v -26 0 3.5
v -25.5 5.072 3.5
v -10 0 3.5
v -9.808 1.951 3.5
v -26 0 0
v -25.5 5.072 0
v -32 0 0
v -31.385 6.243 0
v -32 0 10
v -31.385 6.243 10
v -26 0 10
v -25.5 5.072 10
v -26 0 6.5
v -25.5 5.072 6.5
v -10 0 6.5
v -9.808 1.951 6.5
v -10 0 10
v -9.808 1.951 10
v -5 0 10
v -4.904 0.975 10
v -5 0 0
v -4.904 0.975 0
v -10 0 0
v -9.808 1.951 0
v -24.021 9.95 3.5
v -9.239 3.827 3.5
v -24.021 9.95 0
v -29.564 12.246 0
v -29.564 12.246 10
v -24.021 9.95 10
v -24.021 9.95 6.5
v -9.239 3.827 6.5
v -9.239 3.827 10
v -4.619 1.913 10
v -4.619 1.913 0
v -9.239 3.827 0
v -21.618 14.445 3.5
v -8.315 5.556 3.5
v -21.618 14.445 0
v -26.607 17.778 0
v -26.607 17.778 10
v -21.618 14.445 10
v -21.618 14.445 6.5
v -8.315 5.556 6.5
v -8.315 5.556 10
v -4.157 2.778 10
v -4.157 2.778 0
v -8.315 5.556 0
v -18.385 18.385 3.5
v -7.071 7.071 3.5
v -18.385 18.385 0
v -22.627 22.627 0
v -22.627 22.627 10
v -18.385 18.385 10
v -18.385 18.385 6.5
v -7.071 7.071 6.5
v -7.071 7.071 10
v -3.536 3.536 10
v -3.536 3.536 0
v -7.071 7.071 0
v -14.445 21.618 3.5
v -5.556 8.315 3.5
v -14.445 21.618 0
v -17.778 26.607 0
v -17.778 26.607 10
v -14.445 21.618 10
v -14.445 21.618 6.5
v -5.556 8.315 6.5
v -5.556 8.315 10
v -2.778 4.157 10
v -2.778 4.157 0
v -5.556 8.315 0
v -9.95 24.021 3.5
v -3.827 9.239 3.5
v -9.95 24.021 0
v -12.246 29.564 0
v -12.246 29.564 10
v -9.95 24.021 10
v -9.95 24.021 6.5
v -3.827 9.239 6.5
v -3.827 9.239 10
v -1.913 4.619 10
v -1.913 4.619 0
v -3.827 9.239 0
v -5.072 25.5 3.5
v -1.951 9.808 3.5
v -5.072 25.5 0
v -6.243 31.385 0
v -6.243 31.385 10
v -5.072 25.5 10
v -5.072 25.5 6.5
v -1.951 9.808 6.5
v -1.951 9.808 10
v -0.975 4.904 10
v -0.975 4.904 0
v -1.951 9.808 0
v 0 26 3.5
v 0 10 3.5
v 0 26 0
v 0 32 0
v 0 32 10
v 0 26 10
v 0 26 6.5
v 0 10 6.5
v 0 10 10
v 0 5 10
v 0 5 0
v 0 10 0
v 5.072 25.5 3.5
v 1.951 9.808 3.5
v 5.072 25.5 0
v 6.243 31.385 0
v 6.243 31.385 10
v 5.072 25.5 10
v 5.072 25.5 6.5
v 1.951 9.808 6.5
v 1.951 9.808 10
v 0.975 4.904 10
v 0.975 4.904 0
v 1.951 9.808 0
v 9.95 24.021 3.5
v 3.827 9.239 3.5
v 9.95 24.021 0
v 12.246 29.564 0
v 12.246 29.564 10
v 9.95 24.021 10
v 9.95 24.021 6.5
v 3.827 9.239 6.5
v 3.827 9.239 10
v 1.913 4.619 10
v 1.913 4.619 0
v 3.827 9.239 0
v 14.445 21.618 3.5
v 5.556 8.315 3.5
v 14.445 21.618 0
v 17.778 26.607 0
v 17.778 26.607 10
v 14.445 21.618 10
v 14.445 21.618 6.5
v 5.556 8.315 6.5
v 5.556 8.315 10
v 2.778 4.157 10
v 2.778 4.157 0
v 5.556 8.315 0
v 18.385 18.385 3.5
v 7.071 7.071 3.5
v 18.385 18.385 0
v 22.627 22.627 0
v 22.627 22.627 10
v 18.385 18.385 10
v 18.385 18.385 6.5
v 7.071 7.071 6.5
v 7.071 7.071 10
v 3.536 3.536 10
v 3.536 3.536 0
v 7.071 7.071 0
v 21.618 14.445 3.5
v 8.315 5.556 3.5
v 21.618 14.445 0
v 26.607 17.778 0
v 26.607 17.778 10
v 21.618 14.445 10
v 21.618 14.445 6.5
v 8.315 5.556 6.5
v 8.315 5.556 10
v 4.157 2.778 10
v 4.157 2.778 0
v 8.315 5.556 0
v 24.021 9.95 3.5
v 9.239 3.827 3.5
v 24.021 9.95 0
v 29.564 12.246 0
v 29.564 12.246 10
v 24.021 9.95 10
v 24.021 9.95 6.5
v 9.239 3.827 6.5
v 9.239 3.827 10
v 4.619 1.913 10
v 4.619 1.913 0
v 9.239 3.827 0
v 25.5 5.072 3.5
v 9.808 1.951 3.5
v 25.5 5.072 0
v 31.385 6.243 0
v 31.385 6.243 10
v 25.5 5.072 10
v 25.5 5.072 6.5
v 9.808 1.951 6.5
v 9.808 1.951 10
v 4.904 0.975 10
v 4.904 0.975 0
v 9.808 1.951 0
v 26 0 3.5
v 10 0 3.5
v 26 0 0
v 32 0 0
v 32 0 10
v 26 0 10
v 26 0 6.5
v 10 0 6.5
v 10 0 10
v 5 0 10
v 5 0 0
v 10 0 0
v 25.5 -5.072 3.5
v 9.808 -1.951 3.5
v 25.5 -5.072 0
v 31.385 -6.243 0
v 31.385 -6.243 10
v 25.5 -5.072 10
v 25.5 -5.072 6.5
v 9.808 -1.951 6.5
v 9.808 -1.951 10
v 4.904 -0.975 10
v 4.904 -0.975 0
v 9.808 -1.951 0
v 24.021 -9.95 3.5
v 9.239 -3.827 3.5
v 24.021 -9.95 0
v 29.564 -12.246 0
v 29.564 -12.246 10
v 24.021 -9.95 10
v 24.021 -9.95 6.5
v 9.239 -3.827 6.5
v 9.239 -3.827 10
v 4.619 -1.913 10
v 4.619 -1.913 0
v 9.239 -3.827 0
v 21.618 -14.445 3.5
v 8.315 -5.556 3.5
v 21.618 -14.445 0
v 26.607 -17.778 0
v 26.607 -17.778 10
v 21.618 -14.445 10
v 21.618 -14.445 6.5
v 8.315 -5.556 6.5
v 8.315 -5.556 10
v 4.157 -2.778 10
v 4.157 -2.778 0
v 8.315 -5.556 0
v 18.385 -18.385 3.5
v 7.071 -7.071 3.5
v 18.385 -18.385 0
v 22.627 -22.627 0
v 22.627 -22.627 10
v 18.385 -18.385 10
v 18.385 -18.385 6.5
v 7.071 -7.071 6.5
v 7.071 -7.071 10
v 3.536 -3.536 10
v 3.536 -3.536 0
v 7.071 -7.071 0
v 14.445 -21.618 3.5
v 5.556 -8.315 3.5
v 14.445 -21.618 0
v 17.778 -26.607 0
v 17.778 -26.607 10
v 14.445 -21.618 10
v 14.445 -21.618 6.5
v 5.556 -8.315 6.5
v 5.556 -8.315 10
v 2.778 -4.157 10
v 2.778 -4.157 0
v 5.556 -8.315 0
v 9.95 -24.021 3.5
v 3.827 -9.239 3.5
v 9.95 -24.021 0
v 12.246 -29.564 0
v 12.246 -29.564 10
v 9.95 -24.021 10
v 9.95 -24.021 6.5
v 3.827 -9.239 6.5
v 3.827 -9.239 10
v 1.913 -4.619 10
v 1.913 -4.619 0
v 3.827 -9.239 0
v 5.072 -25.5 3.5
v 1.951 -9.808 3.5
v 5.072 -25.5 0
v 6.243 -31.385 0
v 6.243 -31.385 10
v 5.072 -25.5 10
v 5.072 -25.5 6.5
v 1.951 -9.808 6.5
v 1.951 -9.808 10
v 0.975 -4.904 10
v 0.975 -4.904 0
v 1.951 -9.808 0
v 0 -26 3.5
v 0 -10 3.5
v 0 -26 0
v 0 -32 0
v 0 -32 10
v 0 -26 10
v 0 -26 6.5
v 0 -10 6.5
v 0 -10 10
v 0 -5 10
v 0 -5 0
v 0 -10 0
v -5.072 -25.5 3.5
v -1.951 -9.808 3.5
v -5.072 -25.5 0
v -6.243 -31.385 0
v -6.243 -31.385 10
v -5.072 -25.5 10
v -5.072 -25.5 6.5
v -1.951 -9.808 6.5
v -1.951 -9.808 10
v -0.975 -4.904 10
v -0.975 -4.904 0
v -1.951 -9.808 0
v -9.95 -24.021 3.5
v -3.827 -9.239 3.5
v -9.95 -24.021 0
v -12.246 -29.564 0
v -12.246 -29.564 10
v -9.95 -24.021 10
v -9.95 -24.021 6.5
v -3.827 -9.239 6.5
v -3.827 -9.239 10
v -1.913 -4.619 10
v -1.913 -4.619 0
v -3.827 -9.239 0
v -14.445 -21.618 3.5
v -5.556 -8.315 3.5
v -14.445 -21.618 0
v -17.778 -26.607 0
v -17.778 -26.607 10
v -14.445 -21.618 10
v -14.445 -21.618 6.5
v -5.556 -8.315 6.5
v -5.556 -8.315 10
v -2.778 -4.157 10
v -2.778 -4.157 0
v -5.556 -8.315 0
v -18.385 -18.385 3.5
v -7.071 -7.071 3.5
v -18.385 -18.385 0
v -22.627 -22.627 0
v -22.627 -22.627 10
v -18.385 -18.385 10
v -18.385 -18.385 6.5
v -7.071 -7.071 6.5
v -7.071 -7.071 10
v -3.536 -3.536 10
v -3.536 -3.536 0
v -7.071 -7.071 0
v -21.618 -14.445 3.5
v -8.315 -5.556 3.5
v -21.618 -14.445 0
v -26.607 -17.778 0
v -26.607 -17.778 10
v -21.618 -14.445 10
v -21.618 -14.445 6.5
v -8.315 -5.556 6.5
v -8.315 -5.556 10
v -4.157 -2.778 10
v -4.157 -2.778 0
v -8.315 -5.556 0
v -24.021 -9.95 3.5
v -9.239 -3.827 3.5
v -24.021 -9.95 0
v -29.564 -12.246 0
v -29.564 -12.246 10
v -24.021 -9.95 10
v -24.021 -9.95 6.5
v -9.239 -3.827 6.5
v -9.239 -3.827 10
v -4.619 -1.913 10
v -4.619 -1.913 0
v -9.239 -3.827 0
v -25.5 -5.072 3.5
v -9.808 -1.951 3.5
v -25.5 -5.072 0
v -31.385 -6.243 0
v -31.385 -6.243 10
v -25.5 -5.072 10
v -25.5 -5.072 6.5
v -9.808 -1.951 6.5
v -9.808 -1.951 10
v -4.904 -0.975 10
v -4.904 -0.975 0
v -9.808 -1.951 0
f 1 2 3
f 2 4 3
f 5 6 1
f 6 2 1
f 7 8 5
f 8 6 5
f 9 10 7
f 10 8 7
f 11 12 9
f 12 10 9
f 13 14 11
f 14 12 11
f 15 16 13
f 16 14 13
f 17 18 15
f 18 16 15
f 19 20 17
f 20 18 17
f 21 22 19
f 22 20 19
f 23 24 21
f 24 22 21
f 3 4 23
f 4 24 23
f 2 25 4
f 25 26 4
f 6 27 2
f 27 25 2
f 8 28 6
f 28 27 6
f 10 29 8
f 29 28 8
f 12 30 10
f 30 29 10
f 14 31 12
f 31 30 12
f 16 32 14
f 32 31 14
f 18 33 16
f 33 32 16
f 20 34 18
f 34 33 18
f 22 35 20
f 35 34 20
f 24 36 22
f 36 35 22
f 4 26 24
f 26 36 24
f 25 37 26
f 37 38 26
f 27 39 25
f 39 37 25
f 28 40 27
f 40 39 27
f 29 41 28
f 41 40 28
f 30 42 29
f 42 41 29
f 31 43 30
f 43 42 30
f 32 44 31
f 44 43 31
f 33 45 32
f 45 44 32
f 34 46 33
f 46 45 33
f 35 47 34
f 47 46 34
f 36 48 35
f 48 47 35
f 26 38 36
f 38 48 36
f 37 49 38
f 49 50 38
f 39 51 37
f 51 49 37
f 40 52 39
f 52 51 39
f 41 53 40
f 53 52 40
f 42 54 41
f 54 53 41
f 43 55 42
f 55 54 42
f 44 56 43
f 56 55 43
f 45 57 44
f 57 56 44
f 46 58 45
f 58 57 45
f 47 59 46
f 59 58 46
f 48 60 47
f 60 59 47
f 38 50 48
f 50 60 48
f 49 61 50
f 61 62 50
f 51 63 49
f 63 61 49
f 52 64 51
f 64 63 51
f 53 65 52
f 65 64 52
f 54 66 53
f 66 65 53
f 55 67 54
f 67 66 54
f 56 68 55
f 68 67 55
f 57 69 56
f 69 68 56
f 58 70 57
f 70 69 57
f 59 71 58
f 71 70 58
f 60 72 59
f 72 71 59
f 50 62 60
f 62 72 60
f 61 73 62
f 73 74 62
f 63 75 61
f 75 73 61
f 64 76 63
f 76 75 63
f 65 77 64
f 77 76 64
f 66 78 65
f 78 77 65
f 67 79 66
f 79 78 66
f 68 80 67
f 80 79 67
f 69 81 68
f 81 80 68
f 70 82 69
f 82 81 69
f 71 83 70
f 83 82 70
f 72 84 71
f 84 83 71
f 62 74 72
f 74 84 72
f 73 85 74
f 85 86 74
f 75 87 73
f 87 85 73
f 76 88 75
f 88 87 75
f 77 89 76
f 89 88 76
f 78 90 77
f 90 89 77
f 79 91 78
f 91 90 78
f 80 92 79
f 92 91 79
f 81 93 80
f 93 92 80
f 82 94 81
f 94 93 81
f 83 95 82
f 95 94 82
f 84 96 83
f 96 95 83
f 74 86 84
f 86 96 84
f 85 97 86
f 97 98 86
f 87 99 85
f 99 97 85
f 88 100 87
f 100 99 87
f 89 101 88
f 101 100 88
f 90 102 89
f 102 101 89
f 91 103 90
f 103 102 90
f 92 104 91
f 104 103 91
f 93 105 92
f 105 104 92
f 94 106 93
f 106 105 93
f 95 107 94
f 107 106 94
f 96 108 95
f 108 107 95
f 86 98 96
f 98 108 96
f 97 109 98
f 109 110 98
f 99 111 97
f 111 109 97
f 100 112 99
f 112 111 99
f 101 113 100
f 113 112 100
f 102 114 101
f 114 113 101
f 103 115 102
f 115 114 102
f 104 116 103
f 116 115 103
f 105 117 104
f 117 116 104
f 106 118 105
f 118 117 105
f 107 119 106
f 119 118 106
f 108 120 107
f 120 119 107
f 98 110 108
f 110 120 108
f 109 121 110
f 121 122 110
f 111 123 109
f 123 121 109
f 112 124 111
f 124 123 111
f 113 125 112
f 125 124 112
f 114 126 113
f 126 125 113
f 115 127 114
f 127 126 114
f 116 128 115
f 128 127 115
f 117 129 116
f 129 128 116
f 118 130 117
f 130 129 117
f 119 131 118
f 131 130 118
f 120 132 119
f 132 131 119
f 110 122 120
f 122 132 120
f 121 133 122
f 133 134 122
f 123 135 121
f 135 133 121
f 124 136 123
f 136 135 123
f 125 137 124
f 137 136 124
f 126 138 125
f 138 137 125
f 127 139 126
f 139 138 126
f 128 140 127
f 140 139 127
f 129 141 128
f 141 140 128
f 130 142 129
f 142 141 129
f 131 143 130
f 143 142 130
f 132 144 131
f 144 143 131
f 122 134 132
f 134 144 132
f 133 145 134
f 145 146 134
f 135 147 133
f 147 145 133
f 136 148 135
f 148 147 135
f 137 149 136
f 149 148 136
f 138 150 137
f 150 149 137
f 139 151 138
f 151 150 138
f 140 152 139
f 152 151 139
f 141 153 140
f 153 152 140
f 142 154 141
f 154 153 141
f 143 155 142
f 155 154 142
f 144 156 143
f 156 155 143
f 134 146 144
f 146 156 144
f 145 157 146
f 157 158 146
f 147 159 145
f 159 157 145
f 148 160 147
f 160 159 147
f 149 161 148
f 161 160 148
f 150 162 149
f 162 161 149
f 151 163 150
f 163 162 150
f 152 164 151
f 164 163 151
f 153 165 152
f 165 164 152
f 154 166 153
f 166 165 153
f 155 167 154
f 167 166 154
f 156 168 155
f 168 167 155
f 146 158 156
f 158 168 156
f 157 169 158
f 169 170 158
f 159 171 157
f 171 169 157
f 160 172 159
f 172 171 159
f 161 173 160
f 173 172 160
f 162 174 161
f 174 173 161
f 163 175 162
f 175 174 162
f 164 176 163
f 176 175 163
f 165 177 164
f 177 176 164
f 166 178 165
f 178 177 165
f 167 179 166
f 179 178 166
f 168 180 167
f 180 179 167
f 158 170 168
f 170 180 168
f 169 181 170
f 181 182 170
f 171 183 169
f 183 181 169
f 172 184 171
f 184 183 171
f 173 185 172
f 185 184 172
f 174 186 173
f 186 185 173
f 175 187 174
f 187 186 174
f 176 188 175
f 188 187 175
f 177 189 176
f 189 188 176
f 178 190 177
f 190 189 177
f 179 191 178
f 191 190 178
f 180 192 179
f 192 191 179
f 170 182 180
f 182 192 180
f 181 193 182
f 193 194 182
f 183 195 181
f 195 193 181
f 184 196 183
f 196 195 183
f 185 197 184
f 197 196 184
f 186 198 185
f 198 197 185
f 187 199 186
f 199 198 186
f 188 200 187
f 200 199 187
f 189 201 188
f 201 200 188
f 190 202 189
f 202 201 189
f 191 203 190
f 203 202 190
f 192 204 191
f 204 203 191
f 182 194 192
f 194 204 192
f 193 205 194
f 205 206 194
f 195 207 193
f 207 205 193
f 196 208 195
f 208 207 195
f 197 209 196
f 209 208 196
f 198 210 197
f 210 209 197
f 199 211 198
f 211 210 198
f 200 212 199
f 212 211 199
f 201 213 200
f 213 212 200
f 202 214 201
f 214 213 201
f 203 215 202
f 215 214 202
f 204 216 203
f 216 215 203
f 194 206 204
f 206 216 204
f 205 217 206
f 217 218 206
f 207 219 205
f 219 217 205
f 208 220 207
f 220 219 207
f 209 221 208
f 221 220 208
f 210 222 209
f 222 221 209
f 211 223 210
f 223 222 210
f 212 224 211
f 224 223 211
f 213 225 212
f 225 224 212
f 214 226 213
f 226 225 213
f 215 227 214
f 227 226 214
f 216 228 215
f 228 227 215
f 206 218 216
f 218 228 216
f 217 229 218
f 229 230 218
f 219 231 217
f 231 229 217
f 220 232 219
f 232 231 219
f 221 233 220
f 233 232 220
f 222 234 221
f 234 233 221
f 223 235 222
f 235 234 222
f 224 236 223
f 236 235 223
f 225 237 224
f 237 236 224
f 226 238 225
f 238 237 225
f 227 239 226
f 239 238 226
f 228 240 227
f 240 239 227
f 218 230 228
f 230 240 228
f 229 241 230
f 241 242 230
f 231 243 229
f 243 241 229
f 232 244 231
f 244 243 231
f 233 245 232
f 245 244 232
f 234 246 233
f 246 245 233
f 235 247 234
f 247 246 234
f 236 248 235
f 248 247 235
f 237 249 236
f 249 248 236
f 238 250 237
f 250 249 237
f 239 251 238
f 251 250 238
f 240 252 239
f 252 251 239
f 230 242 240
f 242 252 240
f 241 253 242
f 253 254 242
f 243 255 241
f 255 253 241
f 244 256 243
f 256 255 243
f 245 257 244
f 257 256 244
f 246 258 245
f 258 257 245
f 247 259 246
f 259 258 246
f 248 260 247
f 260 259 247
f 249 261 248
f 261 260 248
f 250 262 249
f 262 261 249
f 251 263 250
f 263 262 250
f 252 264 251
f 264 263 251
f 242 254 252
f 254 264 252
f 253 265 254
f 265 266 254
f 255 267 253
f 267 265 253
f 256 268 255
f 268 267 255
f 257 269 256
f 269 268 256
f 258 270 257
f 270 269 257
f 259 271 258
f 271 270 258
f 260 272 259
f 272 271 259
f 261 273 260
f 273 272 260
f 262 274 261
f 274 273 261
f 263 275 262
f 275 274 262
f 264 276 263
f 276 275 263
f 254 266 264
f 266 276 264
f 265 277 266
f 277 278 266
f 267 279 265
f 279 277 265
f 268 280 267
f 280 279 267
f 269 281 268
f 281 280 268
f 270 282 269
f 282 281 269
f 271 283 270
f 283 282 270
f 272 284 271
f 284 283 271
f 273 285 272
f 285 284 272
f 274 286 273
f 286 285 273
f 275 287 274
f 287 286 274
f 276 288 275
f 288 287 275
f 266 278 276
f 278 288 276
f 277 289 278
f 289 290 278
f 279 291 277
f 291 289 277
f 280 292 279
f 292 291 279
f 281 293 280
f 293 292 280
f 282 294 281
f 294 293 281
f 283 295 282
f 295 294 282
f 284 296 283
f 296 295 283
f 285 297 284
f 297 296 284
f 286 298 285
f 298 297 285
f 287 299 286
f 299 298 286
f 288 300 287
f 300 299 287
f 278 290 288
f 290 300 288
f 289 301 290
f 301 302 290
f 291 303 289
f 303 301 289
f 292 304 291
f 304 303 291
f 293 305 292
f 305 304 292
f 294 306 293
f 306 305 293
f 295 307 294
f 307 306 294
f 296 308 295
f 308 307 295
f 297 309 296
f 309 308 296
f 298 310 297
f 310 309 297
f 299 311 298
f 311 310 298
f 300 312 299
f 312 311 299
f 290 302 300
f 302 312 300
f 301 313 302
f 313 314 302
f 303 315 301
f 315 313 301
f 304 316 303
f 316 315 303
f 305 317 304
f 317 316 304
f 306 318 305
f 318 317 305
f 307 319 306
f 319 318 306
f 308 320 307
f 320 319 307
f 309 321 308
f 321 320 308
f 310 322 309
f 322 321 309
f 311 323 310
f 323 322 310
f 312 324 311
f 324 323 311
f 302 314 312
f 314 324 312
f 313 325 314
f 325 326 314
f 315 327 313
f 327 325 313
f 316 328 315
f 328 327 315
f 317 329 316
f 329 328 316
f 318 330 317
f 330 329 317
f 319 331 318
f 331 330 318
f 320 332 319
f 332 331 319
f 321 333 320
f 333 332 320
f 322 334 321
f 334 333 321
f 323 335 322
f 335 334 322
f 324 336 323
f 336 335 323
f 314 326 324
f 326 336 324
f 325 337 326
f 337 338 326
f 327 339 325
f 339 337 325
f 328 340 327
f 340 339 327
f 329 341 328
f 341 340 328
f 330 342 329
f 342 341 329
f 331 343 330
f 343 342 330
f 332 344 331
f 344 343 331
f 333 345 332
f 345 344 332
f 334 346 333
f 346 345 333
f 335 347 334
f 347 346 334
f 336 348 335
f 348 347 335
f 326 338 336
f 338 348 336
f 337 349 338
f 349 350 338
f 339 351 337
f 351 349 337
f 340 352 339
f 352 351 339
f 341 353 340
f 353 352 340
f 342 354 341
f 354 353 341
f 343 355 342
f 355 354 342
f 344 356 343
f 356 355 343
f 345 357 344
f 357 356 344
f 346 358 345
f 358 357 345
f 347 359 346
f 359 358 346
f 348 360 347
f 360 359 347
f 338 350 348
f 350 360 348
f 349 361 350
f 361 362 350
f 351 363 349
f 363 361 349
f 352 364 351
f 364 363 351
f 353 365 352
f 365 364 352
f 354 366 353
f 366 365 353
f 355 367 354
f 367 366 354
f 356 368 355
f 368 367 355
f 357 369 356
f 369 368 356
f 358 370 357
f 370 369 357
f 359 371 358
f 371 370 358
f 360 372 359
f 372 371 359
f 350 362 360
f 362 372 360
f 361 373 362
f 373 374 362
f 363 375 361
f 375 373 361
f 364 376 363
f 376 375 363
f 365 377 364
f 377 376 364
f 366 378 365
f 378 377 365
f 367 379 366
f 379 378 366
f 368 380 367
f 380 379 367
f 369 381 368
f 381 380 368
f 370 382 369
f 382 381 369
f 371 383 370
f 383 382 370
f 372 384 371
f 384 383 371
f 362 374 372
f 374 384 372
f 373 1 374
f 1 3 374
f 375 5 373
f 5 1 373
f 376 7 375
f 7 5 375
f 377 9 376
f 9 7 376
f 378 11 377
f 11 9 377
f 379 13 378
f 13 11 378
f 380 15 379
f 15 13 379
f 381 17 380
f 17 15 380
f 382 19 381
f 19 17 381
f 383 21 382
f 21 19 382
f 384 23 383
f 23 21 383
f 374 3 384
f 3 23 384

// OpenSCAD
$fn = 32;

// ----------------------------------------------------------------------
// Revolved part: handwheel R32
// ----------------------------------------------------------------------

// --- parameters (mm) ---
bore_r = 5;               // bore radius
rim_r = 32;               // rim radius
rim_w = 6;                // rim axial width
rim_t = 10;               // rim diameter height
hub_r = 10;               // hub radius
web_t = 3;                // web thickness
revolve_angle = 360;      // revolve sweep, degrees

bore_d = 2 * bore_r;
rim_d = 2 * rim_r;
hub_d = 2 * hub_r;

profile = [[5, 0], [10, 0], [10, 3.5], [26, 3.5], [26, 0], [32, 0], [32, 10], [26, 10], [26, 6.5], [10, 6.5], [10, 10], [5, 10]];  // primary outline, 12 points, counter clockwise

// --- the one profile operation ---
rotate_extrude(angle = revolve_angle) polygon(points = profile);
